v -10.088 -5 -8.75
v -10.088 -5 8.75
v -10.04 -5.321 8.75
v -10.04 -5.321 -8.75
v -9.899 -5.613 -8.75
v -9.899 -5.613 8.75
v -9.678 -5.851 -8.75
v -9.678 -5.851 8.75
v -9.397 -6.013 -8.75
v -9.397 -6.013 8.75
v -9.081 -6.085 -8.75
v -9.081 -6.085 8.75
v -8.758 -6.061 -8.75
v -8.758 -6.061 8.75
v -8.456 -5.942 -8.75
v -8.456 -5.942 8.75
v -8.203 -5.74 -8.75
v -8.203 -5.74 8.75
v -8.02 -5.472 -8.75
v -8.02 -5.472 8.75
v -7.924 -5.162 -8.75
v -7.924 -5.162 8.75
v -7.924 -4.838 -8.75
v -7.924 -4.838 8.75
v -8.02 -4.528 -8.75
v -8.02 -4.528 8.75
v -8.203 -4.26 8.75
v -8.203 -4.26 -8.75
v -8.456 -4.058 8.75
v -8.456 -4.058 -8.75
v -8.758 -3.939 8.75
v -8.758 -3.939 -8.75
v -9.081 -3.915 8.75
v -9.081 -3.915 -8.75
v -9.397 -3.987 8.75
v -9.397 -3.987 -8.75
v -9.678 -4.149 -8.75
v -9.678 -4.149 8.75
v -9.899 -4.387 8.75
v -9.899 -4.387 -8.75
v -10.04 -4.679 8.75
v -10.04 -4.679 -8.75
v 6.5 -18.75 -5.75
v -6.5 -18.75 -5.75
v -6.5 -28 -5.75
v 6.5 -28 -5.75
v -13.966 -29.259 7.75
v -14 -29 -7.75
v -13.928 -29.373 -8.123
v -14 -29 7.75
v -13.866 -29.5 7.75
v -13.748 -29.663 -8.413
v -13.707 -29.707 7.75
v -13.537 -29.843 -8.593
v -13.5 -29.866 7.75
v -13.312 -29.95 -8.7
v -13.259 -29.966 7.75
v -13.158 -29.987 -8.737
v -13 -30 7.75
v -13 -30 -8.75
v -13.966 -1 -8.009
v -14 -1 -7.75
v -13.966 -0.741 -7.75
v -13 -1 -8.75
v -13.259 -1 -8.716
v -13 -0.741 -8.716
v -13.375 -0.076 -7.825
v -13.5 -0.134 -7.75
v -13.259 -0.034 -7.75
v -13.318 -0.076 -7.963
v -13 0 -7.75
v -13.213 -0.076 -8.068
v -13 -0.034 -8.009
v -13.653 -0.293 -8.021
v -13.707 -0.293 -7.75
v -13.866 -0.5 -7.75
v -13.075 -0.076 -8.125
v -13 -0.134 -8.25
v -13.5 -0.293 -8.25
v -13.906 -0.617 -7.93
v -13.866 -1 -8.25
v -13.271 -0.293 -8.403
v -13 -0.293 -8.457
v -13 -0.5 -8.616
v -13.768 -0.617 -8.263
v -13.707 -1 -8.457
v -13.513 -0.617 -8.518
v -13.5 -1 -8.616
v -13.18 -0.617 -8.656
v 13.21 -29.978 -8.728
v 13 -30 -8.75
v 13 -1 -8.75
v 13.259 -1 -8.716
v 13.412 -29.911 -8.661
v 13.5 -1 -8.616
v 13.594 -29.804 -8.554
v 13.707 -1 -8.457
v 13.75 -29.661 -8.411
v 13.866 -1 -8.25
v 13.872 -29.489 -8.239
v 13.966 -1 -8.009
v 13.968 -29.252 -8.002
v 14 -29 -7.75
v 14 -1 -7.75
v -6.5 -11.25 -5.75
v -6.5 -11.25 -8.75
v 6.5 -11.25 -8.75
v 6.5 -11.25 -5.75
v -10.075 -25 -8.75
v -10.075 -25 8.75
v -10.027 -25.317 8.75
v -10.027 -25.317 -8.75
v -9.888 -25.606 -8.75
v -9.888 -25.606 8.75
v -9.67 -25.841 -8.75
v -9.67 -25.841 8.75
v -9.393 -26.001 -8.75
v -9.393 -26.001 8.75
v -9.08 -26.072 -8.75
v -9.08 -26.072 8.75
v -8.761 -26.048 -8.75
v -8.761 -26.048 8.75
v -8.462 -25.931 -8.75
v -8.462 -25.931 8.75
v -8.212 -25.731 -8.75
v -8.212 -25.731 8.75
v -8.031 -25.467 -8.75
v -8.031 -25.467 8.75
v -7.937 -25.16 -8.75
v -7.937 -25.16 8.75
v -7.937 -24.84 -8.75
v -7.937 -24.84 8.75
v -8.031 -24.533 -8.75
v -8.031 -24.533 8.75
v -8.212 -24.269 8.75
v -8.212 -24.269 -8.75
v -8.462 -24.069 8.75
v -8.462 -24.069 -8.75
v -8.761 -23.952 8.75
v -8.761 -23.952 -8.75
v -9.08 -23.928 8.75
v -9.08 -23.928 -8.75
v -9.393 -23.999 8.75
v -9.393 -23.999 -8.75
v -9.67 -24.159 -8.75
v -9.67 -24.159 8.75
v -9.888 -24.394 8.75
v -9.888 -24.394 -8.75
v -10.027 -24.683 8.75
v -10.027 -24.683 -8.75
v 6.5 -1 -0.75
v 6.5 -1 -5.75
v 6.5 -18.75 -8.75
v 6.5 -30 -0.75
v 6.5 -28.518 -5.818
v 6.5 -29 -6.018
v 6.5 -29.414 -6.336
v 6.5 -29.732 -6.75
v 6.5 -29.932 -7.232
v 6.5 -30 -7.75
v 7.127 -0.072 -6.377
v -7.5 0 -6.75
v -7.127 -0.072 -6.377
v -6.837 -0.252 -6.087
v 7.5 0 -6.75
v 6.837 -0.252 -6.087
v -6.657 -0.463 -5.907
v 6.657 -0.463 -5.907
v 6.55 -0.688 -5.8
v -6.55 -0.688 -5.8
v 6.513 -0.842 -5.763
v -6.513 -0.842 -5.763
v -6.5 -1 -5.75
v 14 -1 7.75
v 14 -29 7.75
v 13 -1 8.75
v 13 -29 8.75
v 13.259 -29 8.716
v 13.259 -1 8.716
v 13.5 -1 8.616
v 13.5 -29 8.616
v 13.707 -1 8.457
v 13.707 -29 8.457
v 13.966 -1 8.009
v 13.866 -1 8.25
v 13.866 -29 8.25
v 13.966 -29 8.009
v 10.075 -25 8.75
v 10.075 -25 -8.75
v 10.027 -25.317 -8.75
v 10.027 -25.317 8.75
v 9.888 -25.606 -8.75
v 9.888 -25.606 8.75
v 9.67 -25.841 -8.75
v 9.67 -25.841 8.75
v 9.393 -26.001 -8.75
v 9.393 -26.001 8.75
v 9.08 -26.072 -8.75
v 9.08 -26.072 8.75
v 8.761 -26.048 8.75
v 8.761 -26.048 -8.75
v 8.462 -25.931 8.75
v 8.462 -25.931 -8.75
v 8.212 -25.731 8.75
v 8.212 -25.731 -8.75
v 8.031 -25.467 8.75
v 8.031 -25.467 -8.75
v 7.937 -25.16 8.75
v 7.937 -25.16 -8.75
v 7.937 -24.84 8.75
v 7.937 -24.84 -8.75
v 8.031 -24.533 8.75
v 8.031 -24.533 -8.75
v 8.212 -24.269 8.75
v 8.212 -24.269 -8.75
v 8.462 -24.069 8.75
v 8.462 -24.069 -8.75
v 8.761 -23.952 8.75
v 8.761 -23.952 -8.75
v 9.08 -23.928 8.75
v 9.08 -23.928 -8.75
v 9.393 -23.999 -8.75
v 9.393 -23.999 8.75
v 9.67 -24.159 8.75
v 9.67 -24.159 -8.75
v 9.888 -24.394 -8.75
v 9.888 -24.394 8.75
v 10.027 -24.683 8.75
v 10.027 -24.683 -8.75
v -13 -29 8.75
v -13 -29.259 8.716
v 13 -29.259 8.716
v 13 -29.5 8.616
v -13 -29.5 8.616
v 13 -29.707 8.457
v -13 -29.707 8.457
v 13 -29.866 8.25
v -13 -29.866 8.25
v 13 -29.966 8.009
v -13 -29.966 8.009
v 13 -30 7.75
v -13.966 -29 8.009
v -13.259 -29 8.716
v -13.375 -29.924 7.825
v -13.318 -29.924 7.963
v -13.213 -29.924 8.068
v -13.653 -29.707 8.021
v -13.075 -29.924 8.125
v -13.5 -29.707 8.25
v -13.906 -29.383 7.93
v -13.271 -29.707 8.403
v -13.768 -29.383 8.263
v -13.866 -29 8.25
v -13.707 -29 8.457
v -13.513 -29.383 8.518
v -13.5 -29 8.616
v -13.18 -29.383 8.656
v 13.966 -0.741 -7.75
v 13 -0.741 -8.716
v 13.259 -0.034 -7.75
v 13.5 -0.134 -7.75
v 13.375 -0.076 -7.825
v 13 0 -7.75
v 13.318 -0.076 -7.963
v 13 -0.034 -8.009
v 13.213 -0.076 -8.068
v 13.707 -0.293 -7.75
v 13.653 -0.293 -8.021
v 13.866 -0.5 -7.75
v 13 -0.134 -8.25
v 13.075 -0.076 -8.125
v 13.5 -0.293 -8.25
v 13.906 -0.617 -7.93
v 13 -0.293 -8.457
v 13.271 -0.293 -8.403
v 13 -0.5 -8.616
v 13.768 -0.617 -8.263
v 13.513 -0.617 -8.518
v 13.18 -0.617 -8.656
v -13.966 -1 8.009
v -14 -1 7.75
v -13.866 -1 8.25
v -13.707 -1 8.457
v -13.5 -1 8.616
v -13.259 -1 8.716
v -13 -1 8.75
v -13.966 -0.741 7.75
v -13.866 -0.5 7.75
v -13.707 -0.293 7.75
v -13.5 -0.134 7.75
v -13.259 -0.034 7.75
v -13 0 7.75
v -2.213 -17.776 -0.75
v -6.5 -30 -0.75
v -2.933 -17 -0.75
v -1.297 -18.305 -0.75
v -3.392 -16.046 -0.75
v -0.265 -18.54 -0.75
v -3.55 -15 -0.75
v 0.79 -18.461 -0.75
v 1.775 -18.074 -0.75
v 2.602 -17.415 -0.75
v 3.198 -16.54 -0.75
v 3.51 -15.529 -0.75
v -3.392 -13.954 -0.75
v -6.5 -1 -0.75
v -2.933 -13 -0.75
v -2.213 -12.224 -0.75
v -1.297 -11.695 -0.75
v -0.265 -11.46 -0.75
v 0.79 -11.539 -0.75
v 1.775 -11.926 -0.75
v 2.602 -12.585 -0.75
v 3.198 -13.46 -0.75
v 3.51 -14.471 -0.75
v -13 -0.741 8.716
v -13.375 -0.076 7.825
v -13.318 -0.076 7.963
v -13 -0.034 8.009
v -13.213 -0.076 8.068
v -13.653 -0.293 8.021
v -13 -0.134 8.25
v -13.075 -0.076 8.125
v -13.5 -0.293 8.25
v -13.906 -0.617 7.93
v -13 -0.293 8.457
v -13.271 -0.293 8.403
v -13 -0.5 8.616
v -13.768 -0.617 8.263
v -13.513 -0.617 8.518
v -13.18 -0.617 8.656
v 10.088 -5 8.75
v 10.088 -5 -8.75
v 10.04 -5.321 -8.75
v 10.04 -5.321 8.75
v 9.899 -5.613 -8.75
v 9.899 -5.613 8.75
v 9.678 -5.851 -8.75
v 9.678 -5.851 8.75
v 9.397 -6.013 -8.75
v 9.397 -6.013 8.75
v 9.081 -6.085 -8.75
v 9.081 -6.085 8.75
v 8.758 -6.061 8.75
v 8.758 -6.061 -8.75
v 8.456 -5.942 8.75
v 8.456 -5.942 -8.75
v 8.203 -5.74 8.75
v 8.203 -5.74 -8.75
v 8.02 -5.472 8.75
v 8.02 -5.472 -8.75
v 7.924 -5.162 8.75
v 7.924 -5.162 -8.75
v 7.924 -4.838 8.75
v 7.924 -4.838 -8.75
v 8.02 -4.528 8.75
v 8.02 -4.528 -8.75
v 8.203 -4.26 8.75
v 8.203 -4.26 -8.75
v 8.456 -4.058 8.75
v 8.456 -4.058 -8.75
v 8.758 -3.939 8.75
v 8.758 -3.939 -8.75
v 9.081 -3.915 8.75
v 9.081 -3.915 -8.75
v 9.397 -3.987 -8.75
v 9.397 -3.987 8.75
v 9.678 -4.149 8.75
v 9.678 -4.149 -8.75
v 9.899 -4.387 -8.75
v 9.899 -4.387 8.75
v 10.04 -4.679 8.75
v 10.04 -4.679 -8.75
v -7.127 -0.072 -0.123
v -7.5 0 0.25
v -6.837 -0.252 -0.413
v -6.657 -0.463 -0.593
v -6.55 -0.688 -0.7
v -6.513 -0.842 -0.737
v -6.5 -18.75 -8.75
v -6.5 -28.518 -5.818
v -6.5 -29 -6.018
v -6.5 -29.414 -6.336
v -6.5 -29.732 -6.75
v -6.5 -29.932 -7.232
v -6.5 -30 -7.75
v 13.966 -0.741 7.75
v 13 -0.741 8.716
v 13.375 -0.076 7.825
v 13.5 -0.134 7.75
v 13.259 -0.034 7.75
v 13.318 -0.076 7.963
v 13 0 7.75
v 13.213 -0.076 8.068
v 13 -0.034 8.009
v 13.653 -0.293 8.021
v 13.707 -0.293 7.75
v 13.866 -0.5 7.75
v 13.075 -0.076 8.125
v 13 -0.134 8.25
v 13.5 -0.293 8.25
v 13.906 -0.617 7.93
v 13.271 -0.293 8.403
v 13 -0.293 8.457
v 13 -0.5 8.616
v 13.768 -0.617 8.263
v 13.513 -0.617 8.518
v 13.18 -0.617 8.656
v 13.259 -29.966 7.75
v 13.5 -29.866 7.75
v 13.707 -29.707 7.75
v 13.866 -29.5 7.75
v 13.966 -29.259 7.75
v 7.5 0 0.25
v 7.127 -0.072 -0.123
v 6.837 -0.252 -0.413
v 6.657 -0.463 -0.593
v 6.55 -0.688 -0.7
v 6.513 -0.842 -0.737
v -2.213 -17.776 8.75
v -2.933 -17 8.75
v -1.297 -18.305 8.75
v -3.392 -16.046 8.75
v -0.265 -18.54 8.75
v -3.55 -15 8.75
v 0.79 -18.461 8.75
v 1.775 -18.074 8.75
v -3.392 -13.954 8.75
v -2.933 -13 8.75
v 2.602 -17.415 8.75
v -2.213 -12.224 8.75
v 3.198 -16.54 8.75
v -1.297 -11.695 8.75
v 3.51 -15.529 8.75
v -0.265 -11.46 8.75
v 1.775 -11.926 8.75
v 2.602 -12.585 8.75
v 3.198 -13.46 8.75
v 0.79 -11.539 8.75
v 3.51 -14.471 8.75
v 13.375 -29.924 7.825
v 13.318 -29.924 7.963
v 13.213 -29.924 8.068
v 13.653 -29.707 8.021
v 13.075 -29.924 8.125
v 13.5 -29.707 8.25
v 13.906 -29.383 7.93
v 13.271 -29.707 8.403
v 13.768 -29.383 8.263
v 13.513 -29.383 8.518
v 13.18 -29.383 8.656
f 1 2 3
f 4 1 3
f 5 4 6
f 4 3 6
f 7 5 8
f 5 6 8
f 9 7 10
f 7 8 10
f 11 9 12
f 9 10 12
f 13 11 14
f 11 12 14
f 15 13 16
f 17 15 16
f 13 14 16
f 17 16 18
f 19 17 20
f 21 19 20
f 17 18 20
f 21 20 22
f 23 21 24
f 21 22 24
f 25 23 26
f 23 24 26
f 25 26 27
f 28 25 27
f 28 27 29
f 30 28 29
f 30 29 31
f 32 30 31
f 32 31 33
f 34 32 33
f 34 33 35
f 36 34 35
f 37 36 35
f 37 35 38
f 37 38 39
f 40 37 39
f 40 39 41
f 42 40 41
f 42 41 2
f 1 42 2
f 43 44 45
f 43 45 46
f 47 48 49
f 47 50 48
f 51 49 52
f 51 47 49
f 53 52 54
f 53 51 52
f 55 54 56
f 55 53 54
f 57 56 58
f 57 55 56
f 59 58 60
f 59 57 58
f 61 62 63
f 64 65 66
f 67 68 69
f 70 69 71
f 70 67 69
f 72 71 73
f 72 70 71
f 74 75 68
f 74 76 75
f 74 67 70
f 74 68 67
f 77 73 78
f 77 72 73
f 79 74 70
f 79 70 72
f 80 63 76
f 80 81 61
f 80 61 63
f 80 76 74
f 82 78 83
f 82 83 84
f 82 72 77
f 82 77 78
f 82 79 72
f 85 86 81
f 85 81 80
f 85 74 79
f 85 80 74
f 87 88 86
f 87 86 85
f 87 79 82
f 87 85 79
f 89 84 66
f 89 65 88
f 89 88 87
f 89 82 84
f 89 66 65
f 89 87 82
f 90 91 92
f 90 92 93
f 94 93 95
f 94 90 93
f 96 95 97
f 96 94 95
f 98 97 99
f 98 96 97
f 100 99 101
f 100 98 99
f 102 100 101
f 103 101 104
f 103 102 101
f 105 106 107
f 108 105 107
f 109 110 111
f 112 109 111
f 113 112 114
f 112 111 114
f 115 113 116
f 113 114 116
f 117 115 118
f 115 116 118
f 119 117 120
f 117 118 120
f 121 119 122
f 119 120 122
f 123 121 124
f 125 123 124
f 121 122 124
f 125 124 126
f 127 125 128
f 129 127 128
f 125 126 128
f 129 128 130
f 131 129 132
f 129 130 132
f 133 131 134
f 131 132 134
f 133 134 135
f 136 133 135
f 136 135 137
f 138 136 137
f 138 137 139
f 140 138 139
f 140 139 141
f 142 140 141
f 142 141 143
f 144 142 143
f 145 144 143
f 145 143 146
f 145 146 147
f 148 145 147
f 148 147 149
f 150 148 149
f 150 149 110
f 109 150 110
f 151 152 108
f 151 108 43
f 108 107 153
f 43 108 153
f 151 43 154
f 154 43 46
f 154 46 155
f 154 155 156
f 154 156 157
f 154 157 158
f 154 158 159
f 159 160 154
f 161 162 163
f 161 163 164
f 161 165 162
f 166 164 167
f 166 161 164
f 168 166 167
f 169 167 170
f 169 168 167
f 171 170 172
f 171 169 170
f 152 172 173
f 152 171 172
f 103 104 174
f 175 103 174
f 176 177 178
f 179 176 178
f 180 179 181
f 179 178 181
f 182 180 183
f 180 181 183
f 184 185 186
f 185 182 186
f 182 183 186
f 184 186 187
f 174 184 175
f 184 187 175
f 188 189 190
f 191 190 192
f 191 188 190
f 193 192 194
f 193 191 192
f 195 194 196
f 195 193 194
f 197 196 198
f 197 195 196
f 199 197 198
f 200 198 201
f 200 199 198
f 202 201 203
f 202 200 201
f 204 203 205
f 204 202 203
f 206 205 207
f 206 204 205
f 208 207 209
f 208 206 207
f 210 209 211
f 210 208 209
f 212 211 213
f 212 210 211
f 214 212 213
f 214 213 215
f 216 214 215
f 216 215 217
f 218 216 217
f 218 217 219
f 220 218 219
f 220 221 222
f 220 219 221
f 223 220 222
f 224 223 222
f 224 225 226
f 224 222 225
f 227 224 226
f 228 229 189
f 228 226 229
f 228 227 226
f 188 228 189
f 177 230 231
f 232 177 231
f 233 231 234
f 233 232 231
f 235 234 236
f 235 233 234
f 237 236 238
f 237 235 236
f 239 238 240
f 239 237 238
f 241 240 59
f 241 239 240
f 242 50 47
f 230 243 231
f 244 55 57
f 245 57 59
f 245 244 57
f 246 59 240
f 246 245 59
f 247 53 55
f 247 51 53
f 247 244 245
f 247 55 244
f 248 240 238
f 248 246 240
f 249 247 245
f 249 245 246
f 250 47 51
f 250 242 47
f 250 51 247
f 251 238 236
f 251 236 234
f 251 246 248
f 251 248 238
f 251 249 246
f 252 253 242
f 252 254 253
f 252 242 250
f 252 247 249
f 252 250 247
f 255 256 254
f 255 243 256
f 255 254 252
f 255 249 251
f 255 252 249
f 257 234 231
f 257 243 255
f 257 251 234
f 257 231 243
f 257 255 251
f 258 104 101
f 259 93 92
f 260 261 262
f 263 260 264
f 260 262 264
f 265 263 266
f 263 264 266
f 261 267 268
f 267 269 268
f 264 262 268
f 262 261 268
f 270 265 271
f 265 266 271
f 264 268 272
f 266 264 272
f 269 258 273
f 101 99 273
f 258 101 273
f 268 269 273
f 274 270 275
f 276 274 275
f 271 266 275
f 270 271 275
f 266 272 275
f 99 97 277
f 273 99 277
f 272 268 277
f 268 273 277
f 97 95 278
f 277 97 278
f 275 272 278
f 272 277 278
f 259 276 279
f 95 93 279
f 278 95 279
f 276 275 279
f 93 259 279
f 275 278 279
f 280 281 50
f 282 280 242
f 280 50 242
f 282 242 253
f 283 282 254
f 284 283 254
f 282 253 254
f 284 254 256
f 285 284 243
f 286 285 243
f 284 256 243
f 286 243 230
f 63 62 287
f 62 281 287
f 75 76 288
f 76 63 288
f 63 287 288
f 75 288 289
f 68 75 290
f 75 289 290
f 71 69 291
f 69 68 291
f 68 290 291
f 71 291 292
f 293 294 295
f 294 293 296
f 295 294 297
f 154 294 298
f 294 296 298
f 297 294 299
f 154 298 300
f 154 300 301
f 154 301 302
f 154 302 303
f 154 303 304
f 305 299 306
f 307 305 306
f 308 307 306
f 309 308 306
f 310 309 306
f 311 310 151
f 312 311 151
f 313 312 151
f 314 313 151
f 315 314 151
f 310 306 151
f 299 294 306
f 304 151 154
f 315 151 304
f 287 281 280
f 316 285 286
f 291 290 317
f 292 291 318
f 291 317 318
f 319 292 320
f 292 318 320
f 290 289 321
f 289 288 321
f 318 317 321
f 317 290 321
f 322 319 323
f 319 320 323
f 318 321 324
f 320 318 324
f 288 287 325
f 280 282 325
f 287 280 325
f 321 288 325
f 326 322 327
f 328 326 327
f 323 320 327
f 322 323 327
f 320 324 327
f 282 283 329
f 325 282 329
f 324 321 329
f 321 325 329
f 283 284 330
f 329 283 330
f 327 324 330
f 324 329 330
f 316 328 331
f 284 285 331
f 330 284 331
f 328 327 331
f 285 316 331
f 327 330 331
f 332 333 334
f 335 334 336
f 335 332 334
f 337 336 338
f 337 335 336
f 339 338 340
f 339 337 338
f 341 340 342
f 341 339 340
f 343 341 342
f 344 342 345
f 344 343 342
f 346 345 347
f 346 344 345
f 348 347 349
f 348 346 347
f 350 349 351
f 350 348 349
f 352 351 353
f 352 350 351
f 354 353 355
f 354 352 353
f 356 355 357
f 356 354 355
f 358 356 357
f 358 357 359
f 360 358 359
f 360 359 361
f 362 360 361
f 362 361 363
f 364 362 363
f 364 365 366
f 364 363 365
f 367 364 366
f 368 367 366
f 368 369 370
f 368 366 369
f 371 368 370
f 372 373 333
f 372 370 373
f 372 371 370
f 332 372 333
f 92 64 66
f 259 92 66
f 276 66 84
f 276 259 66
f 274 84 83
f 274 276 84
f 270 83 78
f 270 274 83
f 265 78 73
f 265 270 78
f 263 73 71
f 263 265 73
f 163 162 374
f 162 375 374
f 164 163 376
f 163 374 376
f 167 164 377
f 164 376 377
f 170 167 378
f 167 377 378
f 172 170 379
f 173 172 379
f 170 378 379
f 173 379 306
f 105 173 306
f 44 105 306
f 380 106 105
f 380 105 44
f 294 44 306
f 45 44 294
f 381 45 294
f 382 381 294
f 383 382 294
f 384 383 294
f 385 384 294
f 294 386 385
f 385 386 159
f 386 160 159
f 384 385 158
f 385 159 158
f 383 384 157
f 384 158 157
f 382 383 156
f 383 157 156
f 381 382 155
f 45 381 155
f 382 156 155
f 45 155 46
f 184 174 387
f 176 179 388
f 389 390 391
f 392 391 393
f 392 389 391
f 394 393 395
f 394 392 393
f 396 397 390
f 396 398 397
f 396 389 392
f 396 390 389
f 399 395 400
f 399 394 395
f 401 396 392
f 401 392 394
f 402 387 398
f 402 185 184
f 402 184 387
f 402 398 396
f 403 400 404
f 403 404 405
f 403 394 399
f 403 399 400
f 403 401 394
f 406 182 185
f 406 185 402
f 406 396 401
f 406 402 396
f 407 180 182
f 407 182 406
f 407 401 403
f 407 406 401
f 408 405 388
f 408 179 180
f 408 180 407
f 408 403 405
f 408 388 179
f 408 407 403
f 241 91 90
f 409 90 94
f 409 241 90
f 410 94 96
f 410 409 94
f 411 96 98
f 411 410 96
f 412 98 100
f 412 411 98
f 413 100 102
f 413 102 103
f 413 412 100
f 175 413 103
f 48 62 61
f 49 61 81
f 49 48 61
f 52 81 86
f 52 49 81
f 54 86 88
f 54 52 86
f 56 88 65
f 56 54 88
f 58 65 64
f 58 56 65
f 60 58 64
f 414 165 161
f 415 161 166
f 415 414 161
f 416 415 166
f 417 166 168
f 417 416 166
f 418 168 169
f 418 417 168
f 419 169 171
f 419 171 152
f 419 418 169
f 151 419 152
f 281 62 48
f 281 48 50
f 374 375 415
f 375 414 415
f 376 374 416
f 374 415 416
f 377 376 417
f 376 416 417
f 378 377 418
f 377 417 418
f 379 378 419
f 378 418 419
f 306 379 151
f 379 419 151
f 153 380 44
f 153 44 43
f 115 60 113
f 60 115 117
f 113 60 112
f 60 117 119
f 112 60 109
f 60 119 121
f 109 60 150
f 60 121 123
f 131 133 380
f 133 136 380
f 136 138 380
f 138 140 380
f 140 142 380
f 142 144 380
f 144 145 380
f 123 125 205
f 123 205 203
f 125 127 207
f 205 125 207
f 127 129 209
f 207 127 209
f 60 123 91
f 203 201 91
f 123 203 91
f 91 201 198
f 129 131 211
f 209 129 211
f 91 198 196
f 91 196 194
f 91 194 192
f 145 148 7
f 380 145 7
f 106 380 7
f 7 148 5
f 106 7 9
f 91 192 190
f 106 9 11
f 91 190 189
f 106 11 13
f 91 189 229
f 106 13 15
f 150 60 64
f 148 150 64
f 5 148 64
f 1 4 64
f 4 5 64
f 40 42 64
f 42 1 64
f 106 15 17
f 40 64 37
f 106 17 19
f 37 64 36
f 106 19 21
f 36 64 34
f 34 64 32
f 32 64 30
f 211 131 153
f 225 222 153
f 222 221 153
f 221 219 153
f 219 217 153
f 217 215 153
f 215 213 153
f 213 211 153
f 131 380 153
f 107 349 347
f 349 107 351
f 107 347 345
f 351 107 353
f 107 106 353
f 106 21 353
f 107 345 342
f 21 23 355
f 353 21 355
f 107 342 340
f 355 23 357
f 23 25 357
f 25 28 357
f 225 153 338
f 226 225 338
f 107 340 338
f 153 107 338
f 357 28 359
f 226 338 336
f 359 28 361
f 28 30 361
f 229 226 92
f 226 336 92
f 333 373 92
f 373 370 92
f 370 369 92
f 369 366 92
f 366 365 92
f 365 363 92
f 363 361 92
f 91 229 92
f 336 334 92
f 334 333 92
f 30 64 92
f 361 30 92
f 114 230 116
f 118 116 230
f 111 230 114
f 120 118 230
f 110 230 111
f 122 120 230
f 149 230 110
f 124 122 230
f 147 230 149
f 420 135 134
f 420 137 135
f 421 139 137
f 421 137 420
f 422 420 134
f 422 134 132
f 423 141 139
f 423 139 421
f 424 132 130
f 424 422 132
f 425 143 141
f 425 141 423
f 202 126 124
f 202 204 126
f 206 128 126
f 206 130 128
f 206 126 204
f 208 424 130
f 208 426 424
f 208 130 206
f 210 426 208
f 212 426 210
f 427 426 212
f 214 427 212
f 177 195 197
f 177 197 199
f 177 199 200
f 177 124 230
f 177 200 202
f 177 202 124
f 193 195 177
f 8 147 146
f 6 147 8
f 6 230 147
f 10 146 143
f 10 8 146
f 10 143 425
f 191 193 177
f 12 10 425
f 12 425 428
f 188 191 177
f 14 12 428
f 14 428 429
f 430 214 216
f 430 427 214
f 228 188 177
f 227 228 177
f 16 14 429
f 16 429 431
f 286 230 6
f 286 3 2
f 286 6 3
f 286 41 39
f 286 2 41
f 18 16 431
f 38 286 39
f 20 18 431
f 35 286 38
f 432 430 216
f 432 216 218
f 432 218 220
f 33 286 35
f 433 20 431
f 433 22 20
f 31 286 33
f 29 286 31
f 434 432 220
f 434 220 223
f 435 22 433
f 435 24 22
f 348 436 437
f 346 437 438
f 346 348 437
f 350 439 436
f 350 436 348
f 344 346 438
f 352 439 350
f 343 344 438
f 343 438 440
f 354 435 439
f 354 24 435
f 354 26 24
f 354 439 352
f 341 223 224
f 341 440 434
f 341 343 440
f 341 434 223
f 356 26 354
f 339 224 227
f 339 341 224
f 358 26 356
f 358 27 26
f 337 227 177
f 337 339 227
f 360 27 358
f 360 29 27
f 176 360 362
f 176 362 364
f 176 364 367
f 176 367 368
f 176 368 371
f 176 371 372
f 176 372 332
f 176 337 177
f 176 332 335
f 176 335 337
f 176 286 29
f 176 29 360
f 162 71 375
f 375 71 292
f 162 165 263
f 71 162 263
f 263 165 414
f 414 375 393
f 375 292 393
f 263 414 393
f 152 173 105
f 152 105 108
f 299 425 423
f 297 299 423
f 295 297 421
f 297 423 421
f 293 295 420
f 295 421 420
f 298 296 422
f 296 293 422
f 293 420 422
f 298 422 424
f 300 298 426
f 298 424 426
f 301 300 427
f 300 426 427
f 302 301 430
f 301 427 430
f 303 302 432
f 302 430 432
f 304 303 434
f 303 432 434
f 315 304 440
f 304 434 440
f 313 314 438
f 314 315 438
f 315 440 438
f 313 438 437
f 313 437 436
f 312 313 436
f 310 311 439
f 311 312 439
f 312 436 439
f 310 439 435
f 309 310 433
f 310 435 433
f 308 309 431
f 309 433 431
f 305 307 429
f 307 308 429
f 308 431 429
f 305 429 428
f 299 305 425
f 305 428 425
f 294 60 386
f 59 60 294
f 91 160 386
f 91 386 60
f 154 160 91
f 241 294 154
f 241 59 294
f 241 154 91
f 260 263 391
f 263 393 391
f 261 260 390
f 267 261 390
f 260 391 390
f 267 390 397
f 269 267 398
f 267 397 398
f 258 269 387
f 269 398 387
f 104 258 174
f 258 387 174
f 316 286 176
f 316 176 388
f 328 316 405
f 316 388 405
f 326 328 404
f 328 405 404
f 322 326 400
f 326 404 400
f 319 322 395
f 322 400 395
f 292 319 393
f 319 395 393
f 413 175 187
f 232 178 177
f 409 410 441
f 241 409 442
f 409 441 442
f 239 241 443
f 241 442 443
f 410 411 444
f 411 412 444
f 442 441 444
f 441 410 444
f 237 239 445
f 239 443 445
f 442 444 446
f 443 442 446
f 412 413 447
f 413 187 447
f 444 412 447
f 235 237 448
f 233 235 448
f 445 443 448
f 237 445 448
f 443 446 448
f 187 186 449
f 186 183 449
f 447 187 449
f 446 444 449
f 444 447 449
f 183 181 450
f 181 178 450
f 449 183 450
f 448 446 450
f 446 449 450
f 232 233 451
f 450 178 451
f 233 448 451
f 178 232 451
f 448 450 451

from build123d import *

# Parameters (mm, degrees)
SKETCH_W        = 28
SKETCH_H        = 17.5
SKETCH_W_2      = 13
SKETCH_H_2      = 5
PAD_DEPTH       = 30
SKETCH001_R     = 3.55
SKETCH001_R_2   = 1.075196
SKETCH001_R_3   = 1.087844
POCKET_DEPTH    = 106.725436
SKETCH002_W     = 13
SKETCH002_H     = 7.5
POCKET001_DEPTH = 5
FILLET_R        = 1
FILLET001_R     = 2


with BuildPart() as part:
    # Sketch → Pad (new body)
    with BuildSketch(Plane.XZ):
        Rectangle(SKETCH_W, SKETCH_H)
        with Locations((0, -3.25)):
            Rectangle(SKETCH_W_2, SKETCH_H_2, mode=Mode.SUBTRACT)
    extrude(amount=PAD_DEPTH)

    # Sketch001 (on DatumPlane) → Pocket (cut, through all)
    with BuildSketch(Plane(origin=(0, 0, 8.75), x_dir=(-1, 0, 0), z_dir=(0, 0, 1))):
        with Locations((0, 15)):
            Circle(SKETCH001_R)
        with Locations((9, 25)):
            Circle(SKETCH001_R_2)
        with Locations((9, 5)):
            Circle(SKETCH001_R_3)
    pocket = extrude(amount=-POCKET_DEPTH, mode=Mode.SUBTRACT)

    # Mirrored: Pocket across Sketch001 V_Axis
    add(pocket.mirror(Plane(origin=(0, 0, 8.75), x_dir=(0, 0, 1), z_dir=(-1, 0, 0))), mode=Mode.SUBTRACT)

    # Sketch002 (on Face1 of Mirrored) → Pocket001 (cut)
    with BuildSketch(Plane(origin=(0, 0, -8.75), x_dir=(1, 0, 0), z_dir=(0, 0, -1))):
        with Locations((0, 15)):
            Rectangle(SKETCH002_W, SKETCH002_H)
    extrude(amount=-POCKET001_DEPTH, mode=Mode.SUBTRACT)

    # Fillet
    fillet_edges = [part.edges().sort_by_distance(p)[0] for p in [
        (-14, -15, 8.75),
        (-14, -15, -8.75),
        (-14, 0, 0),
        (-14, -30, 0),
        (14, -15, -8.75),
        (14, -15, 8.75),
        (14, 0, 0),
        (14, -30, 0),
        (0, 0, -8.75),
        (0, 0, 8.75),
        (0, 0, -5.75),
        (6.5, 0, -3.25),
        (0, 0, -0.75),
        (-6.5, 0, -3.25),
        (0, -30, 8.75),
    ]]
    fillet(fillet_edges, radius=FILLET_R)

    # Fillet001
    fillet001_edges = [part.edges().sort_by_distance(p)[0] for p in [
        (0, -30, -5.75),
    ]]
    fillet(fillet001_edges, radius=FILLET001_R)


solid = part.part
